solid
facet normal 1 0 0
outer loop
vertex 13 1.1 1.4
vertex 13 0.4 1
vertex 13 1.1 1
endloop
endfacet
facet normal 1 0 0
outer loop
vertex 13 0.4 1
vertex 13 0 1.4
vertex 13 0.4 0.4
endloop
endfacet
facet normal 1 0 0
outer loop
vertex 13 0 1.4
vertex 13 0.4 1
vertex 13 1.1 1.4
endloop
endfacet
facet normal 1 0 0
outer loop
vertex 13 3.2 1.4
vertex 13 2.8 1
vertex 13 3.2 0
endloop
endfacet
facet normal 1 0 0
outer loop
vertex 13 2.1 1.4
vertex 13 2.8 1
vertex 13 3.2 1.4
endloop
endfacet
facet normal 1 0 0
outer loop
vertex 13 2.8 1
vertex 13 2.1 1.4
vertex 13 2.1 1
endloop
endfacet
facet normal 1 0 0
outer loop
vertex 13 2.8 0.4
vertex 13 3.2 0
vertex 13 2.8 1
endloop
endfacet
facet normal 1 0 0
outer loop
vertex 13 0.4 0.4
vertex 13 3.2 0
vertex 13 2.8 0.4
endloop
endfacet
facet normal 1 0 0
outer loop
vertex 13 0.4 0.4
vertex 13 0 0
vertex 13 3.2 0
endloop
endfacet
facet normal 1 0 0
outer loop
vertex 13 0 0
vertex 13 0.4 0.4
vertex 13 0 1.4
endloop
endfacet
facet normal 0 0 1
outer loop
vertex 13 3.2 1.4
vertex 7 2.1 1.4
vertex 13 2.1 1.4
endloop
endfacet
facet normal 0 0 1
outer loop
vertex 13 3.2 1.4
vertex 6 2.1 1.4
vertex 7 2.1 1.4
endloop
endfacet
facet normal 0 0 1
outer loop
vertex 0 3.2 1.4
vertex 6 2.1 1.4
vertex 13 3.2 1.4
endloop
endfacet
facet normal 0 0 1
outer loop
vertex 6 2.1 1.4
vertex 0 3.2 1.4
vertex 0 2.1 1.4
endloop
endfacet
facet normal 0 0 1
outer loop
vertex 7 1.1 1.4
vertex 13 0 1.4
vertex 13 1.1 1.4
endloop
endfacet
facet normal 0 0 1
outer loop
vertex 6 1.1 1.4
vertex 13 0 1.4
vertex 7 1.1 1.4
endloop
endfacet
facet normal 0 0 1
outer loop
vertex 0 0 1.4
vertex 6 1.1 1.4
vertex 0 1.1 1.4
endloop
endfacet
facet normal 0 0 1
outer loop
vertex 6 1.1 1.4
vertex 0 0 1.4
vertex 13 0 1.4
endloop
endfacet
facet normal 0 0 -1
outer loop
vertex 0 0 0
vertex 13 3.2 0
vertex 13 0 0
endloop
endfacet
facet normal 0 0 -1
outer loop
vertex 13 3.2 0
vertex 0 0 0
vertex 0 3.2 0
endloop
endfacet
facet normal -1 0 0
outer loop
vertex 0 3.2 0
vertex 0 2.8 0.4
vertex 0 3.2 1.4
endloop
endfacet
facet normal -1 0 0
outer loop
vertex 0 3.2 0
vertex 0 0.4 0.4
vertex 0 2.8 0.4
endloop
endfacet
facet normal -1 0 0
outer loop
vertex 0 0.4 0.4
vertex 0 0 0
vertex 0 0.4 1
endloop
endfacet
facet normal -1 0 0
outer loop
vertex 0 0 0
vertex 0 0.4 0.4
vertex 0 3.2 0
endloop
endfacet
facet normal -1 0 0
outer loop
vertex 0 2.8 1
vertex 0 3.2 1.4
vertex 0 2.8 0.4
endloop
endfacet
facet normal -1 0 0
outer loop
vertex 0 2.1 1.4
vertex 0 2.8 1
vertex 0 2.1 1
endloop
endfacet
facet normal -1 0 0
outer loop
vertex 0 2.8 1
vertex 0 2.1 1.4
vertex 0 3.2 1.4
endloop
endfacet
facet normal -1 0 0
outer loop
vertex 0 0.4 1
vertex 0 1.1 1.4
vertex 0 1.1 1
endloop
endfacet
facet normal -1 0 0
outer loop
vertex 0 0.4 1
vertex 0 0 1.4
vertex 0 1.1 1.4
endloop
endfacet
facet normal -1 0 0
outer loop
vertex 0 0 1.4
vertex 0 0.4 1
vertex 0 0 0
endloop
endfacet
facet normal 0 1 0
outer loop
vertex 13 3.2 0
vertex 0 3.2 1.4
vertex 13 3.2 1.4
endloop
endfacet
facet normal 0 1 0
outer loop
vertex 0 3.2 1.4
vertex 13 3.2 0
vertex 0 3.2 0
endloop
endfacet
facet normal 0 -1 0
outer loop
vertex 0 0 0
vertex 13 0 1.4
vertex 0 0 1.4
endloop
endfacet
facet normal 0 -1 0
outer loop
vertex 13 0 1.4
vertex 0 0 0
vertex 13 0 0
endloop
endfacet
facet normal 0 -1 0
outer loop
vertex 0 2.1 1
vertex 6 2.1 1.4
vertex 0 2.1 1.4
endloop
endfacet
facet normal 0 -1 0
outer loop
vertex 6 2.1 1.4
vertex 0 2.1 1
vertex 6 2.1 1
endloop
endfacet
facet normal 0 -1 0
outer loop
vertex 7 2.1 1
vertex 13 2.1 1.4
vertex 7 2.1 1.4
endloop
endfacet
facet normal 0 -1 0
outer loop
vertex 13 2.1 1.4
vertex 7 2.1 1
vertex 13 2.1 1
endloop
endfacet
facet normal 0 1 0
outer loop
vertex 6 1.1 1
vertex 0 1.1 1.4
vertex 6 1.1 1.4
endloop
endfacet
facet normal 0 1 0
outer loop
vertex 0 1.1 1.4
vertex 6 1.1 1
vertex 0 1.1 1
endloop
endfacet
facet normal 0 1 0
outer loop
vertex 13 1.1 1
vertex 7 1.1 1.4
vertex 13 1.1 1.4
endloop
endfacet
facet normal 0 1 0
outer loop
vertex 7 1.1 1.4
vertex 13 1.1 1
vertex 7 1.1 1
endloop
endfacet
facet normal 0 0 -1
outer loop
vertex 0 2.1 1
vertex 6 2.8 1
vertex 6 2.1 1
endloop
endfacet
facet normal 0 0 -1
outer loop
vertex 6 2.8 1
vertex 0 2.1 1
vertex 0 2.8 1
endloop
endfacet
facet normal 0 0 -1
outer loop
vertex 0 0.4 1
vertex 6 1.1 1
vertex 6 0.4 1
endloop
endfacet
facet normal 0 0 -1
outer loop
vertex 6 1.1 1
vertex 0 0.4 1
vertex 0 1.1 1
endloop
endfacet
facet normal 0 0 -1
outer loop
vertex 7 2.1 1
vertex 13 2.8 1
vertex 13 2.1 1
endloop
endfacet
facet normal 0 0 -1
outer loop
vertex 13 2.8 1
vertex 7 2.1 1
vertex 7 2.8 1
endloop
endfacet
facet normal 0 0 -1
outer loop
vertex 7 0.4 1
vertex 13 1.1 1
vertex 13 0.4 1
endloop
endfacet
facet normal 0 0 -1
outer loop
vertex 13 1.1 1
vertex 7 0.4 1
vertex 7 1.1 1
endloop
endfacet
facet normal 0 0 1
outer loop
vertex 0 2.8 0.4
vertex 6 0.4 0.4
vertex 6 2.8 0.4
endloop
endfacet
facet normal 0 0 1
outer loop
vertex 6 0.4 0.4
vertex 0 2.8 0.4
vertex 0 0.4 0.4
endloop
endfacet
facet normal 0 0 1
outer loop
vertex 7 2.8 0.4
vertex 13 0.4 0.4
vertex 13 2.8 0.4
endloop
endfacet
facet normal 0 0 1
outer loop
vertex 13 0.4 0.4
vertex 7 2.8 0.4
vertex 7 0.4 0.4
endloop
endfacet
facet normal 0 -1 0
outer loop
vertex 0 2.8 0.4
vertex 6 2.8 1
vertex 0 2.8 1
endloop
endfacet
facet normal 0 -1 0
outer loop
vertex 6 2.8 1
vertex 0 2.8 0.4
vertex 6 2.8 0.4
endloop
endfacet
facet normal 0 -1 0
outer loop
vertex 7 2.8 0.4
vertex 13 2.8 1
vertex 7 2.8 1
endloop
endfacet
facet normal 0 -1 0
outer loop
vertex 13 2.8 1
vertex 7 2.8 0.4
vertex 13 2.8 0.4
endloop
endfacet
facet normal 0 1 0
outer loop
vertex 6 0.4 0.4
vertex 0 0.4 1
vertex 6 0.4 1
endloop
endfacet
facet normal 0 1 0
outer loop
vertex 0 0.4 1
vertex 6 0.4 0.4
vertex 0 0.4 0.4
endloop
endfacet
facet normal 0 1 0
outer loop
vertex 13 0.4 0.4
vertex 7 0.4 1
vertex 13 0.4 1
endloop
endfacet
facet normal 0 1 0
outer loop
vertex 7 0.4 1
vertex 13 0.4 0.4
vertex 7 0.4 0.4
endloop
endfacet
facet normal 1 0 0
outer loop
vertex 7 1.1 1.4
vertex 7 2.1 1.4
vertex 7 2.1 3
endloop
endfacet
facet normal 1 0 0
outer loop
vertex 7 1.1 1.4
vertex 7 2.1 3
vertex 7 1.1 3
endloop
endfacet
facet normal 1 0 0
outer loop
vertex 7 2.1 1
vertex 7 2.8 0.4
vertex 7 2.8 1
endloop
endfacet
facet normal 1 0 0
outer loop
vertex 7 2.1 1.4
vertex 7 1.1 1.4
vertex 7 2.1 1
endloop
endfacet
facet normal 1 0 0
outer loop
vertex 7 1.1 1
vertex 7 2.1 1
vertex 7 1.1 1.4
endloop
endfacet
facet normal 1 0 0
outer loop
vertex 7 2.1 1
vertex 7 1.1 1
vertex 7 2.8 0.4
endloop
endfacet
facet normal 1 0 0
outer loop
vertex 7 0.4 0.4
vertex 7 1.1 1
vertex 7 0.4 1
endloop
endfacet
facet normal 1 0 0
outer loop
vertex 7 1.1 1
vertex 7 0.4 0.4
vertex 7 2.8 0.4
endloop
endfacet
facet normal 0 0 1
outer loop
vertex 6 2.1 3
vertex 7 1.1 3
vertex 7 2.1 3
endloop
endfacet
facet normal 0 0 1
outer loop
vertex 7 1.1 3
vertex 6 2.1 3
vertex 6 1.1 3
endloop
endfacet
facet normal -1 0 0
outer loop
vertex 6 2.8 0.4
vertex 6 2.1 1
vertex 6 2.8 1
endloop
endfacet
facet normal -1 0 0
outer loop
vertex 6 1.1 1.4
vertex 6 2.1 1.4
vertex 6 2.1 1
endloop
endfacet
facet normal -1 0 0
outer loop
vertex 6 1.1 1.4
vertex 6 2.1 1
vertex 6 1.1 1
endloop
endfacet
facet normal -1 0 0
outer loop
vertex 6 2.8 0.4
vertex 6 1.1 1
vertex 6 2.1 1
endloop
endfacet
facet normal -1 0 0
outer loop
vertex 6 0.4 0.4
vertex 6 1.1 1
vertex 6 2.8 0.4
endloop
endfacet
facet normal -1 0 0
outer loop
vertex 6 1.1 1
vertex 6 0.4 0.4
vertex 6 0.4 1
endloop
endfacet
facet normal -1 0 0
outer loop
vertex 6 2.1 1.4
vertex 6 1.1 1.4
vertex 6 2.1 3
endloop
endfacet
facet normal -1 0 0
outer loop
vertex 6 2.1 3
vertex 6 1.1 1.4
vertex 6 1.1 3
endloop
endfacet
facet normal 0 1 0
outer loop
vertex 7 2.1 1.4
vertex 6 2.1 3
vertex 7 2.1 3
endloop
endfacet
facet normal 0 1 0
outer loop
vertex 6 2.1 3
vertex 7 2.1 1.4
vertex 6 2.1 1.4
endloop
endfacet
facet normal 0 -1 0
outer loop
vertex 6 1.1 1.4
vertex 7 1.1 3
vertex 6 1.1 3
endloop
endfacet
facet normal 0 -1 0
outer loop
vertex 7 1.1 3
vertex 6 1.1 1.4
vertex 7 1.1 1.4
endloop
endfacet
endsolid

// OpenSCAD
difference() {
    cube([13,3.2,1.4],false);
    translate([-0.5,(3.2-1)/2,1.4-0.5]) cube([14,1,1],false);
    translate([-0.4,0.4,0.4]) cube([14,3.2-0.8,0.6],false);
}
#translate([6,(3.2-1)/2,0]) cube([1,1,3],false);
translate([6,0,0]) cube([1,3.2,1.4],false);
